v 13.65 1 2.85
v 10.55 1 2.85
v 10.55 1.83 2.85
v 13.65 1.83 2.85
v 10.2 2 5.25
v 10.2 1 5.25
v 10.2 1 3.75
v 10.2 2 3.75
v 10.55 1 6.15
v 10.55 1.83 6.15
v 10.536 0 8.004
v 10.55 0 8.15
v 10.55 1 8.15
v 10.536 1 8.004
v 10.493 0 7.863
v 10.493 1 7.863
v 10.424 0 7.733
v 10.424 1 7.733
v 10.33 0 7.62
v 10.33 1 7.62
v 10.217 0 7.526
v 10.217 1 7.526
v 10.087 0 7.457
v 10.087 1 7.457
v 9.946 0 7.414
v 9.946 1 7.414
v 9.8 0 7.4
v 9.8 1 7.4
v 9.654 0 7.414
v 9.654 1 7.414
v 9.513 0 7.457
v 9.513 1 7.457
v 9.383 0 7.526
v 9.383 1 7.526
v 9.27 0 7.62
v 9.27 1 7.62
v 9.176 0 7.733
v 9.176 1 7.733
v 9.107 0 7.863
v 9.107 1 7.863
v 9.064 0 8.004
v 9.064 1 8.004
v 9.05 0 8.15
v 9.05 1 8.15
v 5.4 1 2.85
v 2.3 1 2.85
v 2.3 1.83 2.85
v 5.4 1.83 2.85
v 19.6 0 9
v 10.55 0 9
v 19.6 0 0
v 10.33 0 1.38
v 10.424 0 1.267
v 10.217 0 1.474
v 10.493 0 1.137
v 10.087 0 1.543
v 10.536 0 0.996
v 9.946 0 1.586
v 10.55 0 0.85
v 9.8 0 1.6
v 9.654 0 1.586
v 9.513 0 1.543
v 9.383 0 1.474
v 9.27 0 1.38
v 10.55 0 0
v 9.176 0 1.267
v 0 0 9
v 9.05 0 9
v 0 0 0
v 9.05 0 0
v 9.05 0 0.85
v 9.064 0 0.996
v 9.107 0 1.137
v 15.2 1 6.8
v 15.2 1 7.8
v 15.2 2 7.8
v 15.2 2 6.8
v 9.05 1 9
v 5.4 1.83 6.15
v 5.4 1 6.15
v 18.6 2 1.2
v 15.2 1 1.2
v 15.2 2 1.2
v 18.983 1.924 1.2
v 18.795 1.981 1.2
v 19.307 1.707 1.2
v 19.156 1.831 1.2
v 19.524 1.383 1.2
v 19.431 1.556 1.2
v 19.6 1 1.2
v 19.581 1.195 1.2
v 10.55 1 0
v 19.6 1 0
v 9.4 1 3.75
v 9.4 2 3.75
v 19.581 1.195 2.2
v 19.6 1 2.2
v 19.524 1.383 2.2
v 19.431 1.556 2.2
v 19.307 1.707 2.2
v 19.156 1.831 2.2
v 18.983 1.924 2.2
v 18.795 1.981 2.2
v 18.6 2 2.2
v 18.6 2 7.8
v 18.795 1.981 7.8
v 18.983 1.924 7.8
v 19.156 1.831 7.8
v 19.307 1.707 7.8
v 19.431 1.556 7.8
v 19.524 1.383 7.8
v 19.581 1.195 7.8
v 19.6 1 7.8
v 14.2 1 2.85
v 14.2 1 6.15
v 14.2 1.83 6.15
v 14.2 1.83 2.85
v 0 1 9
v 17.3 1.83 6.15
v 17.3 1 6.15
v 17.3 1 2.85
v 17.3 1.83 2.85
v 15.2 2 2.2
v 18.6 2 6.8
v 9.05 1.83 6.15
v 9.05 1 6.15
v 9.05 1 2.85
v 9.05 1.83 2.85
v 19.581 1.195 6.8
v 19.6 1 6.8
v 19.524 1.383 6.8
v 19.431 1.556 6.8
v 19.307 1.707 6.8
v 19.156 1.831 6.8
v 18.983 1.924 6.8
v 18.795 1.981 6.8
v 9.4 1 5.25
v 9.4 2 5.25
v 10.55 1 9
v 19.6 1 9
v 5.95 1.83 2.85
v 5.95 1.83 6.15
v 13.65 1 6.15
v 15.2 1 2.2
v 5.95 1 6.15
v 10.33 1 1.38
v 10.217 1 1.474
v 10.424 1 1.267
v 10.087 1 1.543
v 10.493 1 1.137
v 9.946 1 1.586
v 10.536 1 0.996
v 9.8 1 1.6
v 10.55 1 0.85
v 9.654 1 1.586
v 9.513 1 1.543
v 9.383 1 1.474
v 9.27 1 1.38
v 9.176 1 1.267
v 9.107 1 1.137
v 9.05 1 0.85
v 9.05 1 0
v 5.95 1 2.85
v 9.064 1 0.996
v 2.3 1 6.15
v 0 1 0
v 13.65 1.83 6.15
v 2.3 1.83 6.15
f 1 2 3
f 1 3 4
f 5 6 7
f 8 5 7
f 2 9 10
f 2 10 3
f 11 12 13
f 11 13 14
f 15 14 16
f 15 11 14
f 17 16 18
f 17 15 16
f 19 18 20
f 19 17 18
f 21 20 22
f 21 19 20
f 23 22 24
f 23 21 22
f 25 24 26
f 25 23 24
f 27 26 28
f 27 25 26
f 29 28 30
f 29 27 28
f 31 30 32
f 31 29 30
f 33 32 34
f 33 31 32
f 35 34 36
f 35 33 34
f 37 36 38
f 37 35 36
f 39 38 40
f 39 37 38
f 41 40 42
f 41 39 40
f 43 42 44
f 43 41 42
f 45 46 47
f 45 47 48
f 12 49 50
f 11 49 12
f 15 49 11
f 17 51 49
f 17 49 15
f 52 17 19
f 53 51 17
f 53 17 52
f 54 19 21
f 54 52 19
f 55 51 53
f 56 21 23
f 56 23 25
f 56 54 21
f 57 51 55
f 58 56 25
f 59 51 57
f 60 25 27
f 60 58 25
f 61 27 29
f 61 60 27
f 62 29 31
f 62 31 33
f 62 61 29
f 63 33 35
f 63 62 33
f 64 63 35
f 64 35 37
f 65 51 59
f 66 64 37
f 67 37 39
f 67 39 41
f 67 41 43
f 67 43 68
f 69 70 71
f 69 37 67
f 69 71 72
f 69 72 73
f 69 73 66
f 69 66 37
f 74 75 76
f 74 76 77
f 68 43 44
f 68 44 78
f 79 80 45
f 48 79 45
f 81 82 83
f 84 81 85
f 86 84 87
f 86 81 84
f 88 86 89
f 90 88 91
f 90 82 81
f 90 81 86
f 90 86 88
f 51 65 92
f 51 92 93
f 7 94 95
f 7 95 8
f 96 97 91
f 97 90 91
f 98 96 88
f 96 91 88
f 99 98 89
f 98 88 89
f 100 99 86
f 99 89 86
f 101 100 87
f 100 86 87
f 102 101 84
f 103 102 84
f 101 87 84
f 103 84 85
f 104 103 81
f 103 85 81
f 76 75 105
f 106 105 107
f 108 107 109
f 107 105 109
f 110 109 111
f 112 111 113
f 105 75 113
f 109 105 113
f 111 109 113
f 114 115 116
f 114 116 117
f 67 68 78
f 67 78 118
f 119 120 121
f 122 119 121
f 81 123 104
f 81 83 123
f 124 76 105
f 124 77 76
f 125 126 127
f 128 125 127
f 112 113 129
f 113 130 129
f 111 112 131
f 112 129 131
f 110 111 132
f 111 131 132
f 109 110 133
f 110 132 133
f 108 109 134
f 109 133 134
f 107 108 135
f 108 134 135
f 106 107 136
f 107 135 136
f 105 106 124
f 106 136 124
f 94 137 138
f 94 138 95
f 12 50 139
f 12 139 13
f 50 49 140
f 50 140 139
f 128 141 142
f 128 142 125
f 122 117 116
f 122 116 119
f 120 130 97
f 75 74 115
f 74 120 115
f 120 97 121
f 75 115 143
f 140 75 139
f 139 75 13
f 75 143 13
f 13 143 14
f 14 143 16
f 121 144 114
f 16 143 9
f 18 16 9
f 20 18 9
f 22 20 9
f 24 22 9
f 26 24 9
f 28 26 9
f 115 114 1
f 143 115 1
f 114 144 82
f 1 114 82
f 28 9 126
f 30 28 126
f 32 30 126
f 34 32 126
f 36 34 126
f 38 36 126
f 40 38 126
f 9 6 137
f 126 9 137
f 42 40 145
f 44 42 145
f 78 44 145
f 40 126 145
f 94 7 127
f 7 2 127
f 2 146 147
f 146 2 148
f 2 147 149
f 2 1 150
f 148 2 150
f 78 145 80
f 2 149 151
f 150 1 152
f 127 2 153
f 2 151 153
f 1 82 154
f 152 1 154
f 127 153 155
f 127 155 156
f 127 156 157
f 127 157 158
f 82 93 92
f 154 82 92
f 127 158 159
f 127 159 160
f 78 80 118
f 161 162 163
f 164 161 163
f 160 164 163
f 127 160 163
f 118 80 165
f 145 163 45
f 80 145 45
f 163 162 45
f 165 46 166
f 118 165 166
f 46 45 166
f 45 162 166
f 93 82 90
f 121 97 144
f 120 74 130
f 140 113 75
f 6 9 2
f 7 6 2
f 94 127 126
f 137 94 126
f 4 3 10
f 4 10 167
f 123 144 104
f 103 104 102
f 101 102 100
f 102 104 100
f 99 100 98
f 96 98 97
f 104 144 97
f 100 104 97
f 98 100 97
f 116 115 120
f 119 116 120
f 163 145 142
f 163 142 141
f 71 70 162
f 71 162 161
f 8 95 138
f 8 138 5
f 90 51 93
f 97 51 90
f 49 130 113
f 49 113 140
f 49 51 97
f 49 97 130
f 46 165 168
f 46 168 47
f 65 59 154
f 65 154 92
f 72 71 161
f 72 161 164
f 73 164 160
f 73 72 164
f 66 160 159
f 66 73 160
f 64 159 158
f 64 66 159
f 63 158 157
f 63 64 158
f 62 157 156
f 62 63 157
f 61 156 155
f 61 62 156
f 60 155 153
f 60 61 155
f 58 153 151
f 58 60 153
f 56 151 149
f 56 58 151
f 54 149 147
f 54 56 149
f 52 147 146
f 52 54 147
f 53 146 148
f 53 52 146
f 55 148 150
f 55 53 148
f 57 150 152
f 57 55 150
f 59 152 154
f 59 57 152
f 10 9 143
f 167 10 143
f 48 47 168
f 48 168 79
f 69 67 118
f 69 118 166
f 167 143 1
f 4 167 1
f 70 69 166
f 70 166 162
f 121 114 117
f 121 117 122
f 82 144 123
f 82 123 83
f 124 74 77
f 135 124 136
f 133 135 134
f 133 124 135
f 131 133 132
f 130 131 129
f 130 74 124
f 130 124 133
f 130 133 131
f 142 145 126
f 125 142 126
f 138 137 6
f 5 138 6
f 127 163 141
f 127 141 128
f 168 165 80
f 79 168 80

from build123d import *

# Parameters (mm, degrees)
EXTRUDE_1_DEPTH = 1
SKETCH_2_W      = 3.1
SKETCH_2_H      = 3.3
EXTRUDE_2_DEPTH = 0.83
SKETCH_3_W      = 4.4
SKETCH_3_H      = 1
SKETCH_3_W_2    = 0.8
SKETCH_3_H_2    = 1.5
EXTRUDE_3_DEPTH = 1
FILLET_1_R      = 1


with BuildPart() as part:
    # 草图1 → 凸台-拉伸1 (new body)
    with BuildSketch(Plane(origin=(0, 0, 0), x_dir=(1, 0, 0), z_dir=(0, 1, 0))):
        with BuildLine():
            Line((0, 0), (9.05, 0))
            Line((9.05, 0), (9.05, -0.85))
            ThreePointArc((9.05, -0.85), (9.8, -1.6), (10.55, -0.85))
            Line((10.55, -0.85), (10.55, 0))
            Line((10.55, 0), (19.6, 0))
            Line((19.6, 0), (19.6, -9))
            Line((19.6, -9), (10.55, -9))
            Line((10.55, -9), (10.55, -8.15))
            ThreePointArc((10.55, -8.15), (9.8, -7.4), (9.05, -8.15))
            Line((9.05, -8.15), (9.05, -9))
            Line((9.05, -9), (0, -9))
            Line((0, -9), (0, 0))
        make_face()
    extrude(amount=EXTRUDE_1_DEPTH)

    # 草图2 → 凸台-拉伸2 (add)
    with BuildSketch(Plane(origin=(0, 1, 0), x_dir=(1, 0, 0), z_dir=(0, 1, 0))):
        with Locations((3.85, -4.5)):
            Rectangle(SKETCH_2_W, SKETCH_2_H)
        with Locations((7.5, -4.5)):
            Rectangle(SKETCH_2_W, SKETCH_2_H)
        with Locations((12.1, -4.5)):
            Rectangle(SKETCH_2_W, SKETCH_2_H)
        with Locations((15.75, -4.5)):
            Rectangle(SKETCH_2_W, SKETCH_2_H)
    extrude(amount=EXTRUDE_2_DEPTH)

    # 草图3 → 凸台-拉伸3 (add)
    with BuildSketch(Plane(origin=(0, 1, 0), x_dir=(1, 0, 0), z_dir=(0, 1, 0))):
        with Locations((17.4, -7.3)):
            Rectangle(SKETCH_3_W, SKETCH_3_H)
        with Locations((9.8, -4.5)):
            Rectangle(SKETCH_3_W_2, SKETCH_3_H_2)
        with Locations((17.4, -1.7)):
            Rectangle(SKETCH_3_W, SKETCH_3_H)
    extrude(amount=EXTRUDE_3_DEPTH)

    # 圆角1
    fillet_1_edges = [part.edges().sort_by_distance(p)[0] for p in [
        (19.6, 2, 7.3),
        (19.6, 2, 1.7),
    ]]
    fillet(fillet_1_edges, radius=FILLET_1_R)


solid = part.part
